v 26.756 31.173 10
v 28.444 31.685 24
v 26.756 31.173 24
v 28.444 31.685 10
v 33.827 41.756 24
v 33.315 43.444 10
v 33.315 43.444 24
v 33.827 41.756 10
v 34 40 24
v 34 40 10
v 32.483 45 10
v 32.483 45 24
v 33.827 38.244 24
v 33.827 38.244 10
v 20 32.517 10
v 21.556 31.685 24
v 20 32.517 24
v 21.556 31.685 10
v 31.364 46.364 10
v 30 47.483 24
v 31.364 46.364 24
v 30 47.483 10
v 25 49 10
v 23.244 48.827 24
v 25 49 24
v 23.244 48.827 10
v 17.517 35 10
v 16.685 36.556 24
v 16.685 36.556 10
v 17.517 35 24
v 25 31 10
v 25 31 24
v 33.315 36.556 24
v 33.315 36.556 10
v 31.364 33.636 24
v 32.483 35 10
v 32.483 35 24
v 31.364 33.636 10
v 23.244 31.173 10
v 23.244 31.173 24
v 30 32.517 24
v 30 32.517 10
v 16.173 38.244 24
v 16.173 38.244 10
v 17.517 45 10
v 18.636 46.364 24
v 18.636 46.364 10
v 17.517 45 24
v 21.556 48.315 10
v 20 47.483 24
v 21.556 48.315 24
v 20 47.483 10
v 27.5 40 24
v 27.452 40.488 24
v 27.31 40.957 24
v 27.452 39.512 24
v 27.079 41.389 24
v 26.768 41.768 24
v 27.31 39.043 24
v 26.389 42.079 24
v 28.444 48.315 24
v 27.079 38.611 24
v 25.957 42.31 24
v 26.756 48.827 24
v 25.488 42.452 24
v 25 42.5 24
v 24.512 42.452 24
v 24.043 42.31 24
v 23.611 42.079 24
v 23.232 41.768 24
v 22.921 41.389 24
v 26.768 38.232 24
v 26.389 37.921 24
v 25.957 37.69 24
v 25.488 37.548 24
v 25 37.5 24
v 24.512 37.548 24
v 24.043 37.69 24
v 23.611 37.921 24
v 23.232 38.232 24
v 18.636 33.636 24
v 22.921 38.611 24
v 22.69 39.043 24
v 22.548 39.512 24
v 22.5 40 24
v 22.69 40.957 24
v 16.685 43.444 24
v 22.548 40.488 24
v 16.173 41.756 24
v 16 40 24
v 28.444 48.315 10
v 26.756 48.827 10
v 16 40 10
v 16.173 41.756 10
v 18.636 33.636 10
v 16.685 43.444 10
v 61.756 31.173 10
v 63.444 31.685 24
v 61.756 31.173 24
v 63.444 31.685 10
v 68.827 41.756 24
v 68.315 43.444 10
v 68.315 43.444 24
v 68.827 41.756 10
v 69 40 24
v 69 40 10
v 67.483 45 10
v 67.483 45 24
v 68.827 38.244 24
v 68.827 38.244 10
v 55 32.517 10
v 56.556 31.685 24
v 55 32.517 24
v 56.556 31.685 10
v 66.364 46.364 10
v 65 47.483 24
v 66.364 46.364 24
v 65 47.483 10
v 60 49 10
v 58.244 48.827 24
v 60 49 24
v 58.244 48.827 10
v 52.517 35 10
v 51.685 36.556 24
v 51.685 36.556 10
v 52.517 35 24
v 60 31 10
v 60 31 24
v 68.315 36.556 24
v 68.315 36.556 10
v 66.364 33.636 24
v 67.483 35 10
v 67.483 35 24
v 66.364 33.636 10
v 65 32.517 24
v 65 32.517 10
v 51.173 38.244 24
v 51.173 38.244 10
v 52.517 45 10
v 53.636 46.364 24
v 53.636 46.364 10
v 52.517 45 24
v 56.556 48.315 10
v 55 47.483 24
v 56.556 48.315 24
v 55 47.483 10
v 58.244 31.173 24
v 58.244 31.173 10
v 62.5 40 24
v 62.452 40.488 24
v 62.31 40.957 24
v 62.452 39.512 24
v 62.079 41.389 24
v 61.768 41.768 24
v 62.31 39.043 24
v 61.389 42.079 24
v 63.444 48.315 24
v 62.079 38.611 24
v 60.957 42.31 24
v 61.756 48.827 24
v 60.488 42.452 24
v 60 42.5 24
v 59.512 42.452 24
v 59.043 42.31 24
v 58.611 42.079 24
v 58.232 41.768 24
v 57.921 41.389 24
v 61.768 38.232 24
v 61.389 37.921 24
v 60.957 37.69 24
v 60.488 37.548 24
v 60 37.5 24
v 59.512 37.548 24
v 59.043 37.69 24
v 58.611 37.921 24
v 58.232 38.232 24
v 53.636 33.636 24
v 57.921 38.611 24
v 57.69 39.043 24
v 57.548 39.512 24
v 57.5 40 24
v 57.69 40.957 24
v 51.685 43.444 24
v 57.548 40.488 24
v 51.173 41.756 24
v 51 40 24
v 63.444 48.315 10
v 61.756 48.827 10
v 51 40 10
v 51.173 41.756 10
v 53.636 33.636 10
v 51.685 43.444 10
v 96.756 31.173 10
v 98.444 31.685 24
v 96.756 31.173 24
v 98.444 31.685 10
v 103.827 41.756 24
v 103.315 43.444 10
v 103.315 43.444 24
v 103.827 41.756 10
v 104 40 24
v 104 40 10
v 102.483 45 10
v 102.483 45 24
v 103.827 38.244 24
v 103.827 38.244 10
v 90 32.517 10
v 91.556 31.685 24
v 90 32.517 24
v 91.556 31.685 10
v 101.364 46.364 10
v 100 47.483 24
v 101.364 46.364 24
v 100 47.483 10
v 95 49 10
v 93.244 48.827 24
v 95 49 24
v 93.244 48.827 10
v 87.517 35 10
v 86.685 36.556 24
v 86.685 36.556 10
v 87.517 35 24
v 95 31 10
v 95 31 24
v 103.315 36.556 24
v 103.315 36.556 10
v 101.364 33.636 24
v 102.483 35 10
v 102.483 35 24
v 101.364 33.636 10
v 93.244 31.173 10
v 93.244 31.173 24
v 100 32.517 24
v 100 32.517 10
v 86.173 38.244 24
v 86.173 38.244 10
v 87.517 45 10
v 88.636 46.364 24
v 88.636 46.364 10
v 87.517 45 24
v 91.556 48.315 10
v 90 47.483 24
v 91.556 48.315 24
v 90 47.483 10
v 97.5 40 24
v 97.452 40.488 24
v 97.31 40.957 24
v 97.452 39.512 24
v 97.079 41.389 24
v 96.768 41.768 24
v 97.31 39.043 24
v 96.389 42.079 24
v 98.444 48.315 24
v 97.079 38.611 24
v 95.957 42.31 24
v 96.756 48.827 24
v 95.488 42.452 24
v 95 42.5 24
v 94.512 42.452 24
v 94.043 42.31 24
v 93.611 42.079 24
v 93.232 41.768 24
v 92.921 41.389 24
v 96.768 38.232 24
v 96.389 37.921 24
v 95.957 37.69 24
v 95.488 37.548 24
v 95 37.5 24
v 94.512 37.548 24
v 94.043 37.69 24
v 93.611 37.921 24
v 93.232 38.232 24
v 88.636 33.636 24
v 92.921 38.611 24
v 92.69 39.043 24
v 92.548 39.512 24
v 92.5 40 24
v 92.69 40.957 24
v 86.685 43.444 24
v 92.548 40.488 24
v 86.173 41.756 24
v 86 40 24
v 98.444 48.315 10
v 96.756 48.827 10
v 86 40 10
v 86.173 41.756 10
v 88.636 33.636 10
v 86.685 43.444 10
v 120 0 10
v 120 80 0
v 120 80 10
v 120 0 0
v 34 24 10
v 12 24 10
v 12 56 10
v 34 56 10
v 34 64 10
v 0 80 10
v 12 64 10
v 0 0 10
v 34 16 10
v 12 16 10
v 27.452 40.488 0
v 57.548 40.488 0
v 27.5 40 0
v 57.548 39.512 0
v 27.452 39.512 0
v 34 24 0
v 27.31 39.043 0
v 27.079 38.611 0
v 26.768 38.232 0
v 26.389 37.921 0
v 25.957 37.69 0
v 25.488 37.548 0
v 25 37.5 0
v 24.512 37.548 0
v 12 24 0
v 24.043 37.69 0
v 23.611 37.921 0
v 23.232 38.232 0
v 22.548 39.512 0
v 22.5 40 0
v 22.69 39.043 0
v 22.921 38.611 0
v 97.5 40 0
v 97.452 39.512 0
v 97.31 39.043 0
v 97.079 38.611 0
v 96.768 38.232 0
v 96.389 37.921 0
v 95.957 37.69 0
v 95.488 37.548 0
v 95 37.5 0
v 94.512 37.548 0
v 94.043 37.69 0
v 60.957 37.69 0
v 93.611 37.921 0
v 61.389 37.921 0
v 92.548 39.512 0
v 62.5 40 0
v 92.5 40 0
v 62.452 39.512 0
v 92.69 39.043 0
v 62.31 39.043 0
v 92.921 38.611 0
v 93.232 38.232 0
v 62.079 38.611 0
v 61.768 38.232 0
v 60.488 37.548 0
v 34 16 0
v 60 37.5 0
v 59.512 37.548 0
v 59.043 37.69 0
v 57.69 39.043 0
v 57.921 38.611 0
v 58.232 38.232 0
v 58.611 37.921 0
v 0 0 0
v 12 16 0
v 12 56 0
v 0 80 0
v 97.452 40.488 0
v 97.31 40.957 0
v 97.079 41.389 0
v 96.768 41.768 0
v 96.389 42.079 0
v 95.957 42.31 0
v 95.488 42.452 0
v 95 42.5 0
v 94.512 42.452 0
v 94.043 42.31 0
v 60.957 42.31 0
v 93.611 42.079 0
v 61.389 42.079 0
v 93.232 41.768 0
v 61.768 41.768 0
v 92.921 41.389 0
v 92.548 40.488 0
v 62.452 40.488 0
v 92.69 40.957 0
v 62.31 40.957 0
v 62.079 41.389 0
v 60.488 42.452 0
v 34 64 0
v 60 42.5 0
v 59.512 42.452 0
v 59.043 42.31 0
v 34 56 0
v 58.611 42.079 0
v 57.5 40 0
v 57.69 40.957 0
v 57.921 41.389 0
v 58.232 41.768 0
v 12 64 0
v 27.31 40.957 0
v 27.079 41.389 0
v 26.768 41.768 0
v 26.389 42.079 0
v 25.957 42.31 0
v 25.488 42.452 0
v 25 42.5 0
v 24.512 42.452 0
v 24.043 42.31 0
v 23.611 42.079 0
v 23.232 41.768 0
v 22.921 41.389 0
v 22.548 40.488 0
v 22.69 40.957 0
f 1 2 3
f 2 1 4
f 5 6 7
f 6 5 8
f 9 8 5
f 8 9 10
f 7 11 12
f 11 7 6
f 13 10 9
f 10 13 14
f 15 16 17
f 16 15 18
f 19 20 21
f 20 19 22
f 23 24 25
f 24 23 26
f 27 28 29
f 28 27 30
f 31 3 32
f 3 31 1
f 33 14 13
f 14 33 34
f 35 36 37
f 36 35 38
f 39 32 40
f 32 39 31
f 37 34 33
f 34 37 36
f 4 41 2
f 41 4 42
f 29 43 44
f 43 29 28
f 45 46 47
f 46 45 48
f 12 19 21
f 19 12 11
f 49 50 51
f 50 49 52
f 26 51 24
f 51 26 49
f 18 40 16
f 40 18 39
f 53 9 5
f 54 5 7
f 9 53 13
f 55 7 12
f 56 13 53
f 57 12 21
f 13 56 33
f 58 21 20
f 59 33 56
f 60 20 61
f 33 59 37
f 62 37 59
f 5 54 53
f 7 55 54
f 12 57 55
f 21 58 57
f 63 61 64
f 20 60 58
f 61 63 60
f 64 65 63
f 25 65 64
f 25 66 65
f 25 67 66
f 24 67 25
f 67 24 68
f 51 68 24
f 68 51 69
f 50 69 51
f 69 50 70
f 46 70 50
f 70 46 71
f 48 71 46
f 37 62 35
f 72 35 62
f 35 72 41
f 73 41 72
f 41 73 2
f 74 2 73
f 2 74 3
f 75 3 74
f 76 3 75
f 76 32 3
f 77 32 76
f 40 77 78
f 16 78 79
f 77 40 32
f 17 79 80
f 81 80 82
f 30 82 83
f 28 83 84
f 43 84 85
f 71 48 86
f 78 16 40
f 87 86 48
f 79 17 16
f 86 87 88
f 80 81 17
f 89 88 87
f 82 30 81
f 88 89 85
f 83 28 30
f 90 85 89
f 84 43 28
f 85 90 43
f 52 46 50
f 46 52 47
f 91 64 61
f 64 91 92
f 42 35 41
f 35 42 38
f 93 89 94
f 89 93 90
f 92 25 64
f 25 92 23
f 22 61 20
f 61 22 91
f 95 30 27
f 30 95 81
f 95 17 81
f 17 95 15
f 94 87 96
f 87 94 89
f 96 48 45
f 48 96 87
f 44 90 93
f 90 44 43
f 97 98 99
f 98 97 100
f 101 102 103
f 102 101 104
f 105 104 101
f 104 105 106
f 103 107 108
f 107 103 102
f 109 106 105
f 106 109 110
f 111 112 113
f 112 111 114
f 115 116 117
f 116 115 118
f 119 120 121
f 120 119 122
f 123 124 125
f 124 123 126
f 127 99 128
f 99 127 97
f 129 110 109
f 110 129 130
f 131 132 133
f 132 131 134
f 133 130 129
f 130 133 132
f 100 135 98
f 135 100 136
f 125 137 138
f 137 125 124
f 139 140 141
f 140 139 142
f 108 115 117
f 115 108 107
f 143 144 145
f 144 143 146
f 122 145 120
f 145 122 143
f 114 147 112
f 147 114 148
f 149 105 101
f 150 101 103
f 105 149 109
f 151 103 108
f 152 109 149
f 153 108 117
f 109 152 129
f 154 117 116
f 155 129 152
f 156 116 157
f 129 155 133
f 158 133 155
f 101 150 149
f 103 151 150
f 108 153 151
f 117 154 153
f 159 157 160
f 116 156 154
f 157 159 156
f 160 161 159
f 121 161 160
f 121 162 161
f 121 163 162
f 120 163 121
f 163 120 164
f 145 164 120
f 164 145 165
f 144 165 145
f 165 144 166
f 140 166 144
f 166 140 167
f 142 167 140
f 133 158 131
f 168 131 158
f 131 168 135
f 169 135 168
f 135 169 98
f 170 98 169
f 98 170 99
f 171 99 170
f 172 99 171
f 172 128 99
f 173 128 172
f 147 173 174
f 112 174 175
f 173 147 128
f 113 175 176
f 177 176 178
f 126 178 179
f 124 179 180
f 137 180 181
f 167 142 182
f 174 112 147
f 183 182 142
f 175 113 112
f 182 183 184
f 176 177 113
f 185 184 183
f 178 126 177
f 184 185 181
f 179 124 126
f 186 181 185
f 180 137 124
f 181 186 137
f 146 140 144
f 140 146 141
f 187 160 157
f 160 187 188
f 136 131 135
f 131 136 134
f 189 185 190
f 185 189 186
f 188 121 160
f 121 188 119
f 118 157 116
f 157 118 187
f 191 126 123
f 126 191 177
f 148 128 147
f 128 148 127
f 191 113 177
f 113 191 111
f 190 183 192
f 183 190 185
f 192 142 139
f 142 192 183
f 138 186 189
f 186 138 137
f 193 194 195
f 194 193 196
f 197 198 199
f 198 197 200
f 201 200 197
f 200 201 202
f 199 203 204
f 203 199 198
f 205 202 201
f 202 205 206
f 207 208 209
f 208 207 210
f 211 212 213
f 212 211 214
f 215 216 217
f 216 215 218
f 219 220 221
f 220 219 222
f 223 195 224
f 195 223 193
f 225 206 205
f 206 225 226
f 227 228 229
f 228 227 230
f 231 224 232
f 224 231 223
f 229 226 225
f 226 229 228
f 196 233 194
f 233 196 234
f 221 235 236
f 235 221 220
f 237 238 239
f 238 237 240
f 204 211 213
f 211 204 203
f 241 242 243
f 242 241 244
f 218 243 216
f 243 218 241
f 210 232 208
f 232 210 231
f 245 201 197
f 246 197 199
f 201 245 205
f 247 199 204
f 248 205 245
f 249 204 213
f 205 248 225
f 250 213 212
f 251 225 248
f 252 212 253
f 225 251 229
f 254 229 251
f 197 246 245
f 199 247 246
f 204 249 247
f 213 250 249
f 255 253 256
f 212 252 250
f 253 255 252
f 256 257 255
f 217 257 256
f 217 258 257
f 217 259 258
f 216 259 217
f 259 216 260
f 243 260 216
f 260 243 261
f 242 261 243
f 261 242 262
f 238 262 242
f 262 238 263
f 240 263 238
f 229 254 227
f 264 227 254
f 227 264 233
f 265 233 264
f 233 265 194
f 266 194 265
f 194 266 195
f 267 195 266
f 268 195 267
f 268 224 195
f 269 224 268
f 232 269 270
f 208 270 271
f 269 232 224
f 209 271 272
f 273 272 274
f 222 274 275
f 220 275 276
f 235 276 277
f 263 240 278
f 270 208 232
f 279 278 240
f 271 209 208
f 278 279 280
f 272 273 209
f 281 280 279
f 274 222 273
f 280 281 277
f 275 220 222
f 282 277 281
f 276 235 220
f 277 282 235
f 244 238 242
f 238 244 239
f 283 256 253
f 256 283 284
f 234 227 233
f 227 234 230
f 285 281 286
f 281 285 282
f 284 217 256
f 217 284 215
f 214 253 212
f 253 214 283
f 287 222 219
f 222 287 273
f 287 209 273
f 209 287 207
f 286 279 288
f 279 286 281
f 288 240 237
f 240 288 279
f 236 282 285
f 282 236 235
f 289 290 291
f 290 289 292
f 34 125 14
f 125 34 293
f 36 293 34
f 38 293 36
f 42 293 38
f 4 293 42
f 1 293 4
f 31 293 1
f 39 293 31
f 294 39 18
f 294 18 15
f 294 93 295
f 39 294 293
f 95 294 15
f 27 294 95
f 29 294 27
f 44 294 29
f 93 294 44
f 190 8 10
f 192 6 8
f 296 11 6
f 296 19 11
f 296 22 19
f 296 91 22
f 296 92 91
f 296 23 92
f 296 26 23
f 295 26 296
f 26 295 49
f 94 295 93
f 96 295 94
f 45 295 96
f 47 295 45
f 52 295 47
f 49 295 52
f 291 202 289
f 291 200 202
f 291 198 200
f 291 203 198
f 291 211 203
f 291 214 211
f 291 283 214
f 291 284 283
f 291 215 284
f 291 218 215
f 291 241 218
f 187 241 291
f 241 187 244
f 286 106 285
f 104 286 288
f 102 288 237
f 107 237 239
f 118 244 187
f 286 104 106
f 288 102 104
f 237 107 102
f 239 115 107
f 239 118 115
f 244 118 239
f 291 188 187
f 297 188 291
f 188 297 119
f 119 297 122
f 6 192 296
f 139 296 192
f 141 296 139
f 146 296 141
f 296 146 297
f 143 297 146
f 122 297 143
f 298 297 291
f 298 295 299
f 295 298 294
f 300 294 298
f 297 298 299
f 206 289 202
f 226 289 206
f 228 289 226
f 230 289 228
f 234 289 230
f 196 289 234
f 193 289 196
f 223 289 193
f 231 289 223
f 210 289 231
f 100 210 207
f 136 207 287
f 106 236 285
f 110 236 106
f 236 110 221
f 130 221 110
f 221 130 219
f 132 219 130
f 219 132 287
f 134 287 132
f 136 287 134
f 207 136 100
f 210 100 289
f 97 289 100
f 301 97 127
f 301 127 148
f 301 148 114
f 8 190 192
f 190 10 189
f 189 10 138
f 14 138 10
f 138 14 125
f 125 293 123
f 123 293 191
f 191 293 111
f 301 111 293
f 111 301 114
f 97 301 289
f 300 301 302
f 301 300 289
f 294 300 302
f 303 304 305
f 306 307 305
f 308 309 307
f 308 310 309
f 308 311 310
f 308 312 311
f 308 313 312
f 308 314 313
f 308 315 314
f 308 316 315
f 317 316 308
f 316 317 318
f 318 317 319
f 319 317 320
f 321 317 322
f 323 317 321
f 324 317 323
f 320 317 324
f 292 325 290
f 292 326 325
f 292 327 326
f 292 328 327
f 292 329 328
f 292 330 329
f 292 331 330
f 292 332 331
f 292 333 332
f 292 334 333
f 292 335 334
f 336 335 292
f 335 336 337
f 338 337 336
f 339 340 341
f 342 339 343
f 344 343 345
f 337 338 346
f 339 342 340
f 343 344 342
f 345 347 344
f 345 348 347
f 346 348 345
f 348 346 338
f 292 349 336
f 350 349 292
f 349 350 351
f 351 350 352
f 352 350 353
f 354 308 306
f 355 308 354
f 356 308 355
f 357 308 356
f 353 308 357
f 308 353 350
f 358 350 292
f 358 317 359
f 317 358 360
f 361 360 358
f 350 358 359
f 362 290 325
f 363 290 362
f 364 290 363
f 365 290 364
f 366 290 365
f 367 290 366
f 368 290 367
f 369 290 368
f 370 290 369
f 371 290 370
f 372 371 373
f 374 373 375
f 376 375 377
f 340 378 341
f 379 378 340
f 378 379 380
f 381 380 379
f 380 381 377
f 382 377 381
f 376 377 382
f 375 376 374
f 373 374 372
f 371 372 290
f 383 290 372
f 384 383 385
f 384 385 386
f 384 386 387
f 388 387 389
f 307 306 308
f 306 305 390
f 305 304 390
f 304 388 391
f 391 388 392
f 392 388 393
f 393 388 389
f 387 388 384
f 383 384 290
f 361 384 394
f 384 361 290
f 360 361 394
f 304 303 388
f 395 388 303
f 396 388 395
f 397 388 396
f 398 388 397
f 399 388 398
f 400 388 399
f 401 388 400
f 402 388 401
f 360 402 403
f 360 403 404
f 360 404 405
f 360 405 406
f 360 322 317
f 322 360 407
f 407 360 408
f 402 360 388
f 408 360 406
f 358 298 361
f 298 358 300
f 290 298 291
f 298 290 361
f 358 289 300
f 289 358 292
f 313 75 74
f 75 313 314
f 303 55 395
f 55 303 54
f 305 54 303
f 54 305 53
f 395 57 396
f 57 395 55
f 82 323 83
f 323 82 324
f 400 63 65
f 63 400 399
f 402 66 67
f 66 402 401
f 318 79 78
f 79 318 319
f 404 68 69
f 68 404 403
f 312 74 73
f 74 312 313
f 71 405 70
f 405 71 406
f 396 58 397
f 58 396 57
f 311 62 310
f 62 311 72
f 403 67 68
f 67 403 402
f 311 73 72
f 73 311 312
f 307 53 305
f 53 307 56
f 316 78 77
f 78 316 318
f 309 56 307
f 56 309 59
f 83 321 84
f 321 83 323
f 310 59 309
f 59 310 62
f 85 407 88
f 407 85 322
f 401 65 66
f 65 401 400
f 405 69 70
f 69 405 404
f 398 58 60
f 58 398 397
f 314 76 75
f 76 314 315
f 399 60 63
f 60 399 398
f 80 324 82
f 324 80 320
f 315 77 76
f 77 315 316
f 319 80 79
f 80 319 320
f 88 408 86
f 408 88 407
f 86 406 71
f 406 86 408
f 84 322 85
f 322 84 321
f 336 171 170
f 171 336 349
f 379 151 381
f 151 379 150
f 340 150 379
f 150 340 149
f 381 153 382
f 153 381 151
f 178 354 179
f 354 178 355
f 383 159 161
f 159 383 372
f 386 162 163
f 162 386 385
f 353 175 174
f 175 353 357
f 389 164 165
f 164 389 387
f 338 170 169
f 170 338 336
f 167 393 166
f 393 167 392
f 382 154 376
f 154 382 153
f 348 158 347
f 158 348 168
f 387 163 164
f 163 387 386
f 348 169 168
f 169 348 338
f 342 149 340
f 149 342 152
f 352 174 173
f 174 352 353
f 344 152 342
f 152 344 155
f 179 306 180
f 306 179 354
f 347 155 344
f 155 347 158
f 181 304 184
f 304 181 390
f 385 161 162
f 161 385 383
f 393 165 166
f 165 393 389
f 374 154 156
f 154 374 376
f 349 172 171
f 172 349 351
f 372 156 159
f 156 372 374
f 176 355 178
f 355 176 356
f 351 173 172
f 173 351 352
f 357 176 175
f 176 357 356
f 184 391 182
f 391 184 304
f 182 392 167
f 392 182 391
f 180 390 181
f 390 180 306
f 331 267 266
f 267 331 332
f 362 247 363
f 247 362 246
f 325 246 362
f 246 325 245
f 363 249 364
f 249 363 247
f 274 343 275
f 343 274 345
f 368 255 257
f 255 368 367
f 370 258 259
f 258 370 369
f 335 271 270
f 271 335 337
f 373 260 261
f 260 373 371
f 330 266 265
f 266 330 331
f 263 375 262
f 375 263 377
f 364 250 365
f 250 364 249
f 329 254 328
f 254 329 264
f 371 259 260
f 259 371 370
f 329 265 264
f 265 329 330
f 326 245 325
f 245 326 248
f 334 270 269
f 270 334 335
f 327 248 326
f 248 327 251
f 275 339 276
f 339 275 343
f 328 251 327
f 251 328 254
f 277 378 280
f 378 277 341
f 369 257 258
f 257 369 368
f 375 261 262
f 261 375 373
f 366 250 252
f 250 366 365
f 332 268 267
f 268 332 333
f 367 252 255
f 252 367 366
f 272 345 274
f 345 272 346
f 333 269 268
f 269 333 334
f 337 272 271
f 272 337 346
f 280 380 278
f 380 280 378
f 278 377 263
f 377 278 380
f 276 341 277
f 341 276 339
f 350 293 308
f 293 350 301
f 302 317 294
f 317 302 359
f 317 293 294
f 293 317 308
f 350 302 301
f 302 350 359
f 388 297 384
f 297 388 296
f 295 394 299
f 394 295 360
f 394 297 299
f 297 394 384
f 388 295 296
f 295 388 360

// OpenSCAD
$fn = 32;

// ----------------------------------------------------------------------
// Drill jig: three_boss_slot jig
// ----------------------------------------------------------------------

// --- parameters (mm) ---
plate_l = 120;            // plate length, X
plate_w = 80;             // plate width, Y
plate_t = 10;             // plate thickness
boss_d = 18;              // guide boss diameter
boss_h = 15;              // boss height above the plate
guide_d = 5;              // guide hole diameter
boss_pitch = 35;          // boss pitch
slot_w = 8;               // clamp slot width
slot_l = 22;              // clamp slot length
slot_x = 12;              // slot start X

n_boss = 3;  // guide bosses
boss_x0 = (plate_l - (n_boss - 1) * boss_pitch) / 2;  // first boss X
boss_top = plate_t - 1 + boss_h;  // boss crown height
total_h = boss_top;  // overall height

difference() {
  union() {
  cube([plate_l, plate_w, plate_t]);
  for (i = [0 : n_boss - 1])
    translate([boss_x0 + i * boss_pitch, plate_w / 2, plate_t - 1])
      cylinder(h = boss_h, d = boss_d);
  }
  for (i = [0 : n_boss - 1])
    translate([boss_x0 + i * boss_pitch, plate_w / 2, -1])
      cylinder(h = plate_t + boss_h, d = guide_d);
  for (cy = [plate_w * 0.25, plate_w * 0.75])
    translate([slot_x, cy - slot_w / 2, -1])
      cube([slot_l, slot_w, plate_t + 2]);
}
